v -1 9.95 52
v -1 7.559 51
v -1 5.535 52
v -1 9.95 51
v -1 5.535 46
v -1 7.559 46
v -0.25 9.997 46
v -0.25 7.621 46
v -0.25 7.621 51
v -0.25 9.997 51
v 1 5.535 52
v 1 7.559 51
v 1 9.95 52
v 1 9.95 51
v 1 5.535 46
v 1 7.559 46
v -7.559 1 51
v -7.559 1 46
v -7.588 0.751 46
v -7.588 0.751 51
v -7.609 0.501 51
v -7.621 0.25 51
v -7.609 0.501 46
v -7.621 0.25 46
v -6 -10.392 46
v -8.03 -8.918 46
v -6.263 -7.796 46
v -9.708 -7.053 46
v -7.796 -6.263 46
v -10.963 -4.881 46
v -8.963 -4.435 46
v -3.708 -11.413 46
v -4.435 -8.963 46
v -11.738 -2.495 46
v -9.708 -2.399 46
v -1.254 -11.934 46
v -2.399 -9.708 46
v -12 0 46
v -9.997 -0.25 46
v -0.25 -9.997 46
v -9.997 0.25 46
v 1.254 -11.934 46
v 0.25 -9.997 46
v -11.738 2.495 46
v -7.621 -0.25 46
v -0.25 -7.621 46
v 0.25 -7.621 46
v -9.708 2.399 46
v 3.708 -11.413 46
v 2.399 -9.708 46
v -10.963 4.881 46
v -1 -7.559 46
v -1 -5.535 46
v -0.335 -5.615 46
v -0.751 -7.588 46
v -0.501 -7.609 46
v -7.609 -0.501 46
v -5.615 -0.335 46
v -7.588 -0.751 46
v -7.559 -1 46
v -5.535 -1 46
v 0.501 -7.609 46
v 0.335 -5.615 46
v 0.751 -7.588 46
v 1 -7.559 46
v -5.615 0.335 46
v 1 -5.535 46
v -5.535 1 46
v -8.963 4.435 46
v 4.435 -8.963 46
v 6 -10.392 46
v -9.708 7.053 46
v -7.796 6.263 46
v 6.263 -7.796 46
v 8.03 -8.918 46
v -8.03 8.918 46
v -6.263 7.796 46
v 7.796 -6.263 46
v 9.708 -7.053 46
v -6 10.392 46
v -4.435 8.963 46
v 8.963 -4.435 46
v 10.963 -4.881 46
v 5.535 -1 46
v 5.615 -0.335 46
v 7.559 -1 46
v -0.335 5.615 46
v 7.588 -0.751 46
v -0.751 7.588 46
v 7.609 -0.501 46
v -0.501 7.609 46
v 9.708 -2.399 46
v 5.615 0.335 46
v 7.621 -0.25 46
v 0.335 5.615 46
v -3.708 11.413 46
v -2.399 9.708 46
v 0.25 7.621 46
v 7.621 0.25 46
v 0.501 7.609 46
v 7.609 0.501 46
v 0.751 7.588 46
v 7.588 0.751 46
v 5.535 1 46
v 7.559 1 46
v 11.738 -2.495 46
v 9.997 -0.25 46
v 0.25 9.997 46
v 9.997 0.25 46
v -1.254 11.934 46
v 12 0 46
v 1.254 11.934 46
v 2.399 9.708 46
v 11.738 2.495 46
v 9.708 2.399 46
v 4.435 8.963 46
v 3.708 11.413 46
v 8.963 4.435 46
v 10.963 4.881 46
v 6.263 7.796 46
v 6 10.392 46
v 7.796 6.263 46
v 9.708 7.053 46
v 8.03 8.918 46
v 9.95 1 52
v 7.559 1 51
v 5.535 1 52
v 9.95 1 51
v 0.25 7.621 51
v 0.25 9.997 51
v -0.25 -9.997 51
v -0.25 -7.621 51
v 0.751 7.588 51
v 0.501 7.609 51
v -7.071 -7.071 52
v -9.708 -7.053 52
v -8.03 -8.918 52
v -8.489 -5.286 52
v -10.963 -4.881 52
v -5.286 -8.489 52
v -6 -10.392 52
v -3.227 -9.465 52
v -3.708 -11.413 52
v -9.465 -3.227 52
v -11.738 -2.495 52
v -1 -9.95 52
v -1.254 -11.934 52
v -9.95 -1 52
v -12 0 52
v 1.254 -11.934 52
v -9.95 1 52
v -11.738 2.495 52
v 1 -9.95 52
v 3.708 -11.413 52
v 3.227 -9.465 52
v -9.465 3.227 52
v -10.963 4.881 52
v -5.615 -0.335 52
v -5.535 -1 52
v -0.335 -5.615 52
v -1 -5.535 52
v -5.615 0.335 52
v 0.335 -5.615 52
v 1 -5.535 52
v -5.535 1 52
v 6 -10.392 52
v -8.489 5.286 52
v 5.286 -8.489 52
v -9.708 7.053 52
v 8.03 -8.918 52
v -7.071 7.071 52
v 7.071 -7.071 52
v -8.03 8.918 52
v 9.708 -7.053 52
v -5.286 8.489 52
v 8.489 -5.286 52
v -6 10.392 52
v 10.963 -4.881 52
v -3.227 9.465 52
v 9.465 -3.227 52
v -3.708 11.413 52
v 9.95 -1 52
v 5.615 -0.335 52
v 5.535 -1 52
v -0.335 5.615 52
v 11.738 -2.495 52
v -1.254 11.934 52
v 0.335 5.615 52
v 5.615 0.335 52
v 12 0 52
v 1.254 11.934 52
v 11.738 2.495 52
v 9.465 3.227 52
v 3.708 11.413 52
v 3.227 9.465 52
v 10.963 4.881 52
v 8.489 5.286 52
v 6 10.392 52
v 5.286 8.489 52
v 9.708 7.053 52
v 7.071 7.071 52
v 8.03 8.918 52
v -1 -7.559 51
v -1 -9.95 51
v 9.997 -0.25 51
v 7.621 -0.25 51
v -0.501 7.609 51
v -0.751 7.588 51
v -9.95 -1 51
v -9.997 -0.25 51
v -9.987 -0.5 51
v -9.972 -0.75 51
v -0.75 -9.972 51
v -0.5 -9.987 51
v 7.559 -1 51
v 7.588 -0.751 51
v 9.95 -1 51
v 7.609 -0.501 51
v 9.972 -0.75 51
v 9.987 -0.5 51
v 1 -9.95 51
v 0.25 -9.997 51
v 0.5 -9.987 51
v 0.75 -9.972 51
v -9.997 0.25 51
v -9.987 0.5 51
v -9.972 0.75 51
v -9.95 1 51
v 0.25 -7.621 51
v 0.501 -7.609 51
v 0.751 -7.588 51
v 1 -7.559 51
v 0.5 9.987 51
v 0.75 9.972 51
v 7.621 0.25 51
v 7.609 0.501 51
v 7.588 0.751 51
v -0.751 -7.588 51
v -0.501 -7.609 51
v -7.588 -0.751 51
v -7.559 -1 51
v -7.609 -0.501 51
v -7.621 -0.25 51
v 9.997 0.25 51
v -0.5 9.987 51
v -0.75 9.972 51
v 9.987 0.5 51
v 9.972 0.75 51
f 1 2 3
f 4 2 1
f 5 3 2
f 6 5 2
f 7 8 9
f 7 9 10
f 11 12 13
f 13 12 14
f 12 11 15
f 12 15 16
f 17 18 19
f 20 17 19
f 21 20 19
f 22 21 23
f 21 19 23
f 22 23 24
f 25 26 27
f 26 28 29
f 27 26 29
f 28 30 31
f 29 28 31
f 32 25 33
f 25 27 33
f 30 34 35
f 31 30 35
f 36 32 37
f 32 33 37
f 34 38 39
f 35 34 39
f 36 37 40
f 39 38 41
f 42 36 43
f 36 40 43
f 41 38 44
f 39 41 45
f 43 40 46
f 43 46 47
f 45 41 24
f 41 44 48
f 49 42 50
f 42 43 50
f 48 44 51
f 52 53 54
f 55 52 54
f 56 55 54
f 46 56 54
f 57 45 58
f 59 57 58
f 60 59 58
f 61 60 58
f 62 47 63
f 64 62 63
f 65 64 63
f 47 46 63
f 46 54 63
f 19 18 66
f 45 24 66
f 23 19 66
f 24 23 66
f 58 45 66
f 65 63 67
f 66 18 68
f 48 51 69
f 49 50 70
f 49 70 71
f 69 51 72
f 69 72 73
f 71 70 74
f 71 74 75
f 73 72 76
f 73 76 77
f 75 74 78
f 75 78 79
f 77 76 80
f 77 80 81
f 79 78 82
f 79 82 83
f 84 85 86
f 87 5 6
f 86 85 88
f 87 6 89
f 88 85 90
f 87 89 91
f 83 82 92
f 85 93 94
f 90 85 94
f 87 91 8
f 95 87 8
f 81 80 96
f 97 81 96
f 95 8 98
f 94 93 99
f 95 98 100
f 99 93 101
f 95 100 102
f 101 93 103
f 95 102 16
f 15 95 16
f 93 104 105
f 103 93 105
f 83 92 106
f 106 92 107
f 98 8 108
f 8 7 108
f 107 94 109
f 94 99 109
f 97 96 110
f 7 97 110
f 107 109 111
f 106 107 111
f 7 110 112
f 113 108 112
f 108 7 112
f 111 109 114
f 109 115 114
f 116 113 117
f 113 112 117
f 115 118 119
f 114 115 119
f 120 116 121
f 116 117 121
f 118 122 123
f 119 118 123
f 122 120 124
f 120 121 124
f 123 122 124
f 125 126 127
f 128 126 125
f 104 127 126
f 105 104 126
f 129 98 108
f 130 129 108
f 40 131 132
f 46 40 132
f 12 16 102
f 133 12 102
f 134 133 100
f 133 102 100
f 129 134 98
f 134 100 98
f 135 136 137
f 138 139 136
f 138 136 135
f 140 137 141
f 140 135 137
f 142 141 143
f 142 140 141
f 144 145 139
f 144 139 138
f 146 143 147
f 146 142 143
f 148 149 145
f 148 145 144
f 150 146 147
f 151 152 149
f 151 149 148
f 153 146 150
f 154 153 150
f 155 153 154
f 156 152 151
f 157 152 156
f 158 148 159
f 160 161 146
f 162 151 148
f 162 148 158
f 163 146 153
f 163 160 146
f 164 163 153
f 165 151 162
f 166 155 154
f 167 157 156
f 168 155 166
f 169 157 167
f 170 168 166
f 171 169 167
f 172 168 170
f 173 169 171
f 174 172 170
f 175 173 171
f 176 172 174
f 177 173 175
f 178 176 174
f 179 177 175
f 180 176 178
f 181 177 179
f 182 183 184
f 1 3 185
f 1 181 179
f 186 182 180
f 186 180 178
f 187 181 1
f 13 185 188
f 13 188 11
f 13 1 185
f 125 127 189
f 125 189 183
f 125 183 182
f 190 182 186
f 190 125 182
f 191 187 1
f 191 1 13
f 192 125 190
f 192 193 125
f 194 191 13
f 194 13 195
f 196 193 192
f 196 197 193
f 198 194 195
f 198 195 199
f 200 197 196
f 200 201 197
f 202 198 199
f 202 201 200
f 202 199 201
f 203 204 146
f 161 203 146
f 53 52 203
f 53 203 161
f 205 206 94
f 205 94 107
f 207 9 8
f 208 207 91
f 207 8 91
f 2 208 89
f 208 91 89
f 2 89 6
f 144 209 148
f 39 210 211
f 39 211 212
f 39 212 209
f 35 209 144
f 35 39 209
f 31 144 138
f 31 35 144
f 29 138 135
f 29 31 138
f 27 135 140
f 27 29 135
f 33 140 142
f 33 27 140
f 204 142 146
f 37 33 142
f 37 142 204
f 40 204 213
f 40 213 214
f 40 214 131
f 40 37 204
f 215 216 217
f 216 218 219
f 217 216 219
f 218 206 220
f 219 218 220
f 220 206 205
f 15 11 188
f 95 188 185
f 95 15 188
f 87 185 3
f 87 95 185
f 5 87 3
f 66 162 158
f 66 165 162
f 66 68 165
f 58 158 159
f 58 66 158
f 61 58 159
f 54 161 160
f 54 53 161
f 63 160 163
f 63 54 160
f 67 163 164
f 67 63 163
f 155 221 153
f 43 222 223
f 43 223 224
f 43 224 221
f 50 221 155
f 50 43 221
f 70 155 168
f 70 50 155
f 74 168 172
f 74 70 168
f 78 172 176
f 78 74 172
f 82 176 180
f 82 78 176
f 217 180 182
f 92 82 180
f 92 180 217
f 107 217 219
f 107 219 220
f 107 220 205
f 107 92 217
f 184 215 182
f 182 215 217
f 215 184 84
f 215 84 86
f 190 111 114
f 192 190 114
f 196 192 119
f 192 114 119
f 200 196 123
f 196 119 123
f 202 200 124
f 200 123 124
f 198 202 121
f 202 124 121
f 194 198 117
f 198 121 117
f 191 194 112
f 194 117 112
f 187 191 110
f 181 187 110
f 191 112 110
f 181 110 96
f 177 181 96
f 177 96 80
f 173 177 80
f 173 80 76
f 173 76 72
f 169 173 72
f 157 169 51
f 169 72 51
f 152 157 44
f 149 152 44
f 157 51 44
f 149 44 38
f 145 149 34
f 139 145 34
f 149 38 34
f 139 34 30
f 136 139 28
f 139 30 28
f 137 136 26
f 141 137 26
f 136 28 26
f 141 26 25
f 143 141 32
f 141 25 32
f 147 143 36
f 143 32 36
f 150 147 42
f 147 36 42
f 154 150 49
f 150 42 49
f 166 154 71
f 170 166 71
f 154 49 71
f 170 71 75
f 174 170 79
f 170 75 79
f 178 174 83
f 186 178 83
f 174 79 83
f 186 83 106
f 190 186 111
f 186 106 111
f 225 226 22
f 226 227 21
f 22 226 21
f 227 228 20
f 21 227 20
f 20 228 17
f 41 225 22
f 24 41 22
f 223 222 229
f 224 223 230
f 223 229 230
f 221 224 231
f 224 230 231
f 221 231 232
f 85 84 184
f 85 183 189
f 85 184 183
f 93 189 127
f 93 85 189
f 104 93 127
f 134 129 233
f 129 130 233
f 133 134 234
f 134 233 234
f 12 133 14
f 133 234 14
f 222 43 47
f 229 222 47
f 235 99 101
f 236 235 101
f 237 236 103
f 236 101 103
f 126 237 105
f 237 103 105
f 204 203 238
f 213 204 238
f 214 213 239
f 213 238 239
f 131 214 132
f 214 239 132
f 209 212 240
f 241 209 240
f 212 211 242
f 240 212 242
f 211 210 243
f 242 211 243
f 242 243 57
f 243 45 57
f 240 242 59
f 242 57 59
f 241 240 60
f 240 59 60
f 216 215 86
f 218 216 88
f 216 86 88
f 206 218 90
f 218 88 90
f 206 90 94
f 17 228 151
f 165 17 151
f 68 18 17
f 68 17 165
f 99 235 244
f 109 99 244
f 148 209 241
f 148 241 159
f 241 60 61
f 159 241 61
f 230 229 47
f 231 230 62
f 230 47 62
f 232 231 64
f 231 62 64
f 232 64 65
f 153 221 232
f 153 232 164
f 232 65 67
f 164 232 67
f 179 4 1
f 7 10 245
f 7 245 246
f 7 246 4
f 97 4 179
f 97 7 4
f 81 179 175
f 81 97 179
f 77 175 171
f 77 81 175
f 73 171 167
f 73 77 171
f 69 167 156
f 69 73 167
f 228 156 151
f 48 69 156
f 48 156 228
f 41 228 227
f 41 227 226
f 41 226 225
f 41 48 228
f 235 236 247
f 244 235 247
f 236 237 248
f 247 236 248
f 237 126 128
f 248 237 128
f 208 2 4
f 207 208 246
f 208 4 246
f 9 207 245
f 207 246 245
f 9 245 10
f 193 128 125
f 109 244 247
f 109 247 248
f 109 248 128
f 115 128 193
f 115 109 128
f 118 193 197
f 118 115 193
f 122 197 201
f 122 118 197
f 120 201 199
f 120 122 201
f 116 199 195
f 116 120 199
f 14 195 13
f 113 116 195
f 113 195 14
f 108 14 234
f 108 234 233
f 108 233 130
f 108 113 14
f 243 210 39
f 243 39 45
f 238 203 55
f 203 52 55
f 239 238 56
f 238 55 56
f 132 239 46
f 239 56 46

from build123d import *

# Parameters (mm, degrees)
BOX011_W                    = 20
BOX011_H                    = 2
BOX011_DEPTH                = 80
BOX012_W                    = 20
BOX012_H                    = 2
BOX012_DEPTH                = 80
COMPOUND005_PLACEMENT_ANGLE = 90
TUBE013_R                   = 10
TUBE013_R_2                 = 3.25
TUBE013_DEPTH               = 80
TUBE008_R                   = 7.625
TUBE008_R_2                 = 5.625
TUBE008_DEPTH               = 5
TUBE007_R                   = 7.625
TUBE007_R_2                 = 5.625
TUBE007_DEPTH               = 5
BOX005_W                    = 20
BOX005_H                    = 0.5
BOX005_DEPTH                = 40
BOX006_W                    = 20
BOX006_H                    = 0.5
BOX006_DEPTH                = 40
COMPOUND002_PLACEMENT_ANGLE = 90
TUBE006_R                   = 10
TUBE006_R_2                 = 3.25
TUBE006_DEPTH               = 40
CYLINDER002_R               = 5.625
CYLINDER002_DEPTH           = 100
CYLINDER001_R               = 12
CYLINDER001_DEPTH           = 6


with BuildPart() as cube011:
    # Box011 → Box011 (new body)
    with BuildSketch(Plane(origin=(-10, -1, -20), x_dir=(1, 0, 0), z_dir=(0, 0, 1))):
        with Locations((10, 1)):
            Rectangle(BOX011_W, BOX011_H)
    extrude(amount=BOX011_DEPTH)


with BuildPart() as fusion008:
    # Box012 → Box012 (new body)
    with BuildSketch(Plane(origin=(-10, -1, -20), x_dir=(1, 0, 0), z_dir=(0, 0, 1))):
        with Locations((10, 1)):
            Rectangle(BOX012_W, BOX012_H)
    extrude(amount=BOX012_DEPTH)


with BuildPart() as fusion008_1:
    # Compound005 placement: moved
    add(fusion008.part.rotate(Axis((0, 0, 0), (0, 0, 1)), COMPOUND005_PLACEMENT_ANGLE))

    # Fusion008: union Cube011
    add(cube011.part)


with BuildPart() as cut018:
    # Tube013 → Tube013 (new body)
    with BuildSketch(Plane.XY.offset(-20)):
        Circle(TUBE013_R)
        Circle(TUBE013_R_2, mode=Mode.SUBTRACT)
    extrude(amount=TUBE013_DEPTH)

    # Cut018: cut Fusion008
    add(fusion008_1.part, mode=Mode.SUBTRACT)


with BuildPart() as mountringgroove005:
    # Tube008 → Tube008 (new body)
    with BuildSketch(Plane.XY.offset(35)):
        Circle(TUBE008_R)
        Circle(TUBE008_R_2, mode=Mode.SUBTRACT)
    extrude(amount=TUBE008_DEPTH)


with BuildPart() as mountringgroove004:
    # Tube007 → Tube007 (new body)
    with BuildSketch(Plane.XY):
        Circle(TUBE007_R)
        Circle(TUBE007_R_2, mode=Mode.SUBTRACT)
    extrude(amount=TUBE007_DEPTH)


with BuildPart() as cube005:
    # Box005 → Box005 (new body)
    with BuildSketch(Plane(origin=(-10, -0.25, 0), x_dir=(1, 0, 0), z_dir=(0, 0, 1))):
        with Locations((10, 0.25)):
            Rectangle(BOX005_W, BOX005_H)
    extrude(amount=BOX005_DEPTH)


with BuildPart() as fusion002:
    # Box006 → Box006 (new body)
    with BuildSketch(Plane(origin=(-10, -0.25, 0), x_dir=(1, 0, 0), z_dir=(0, 0, 1))):
        with Locations((10, 0.25)):
            Rectangle(BOX006_W, BOX006_H)
    extrude(amount=BOX006_DEPTH)


with BuildPart() as fusion002_1:
    # Compound002 placement: moved
    add(fusion002.part.rotate(Axis((0, 0, 0), (0, 0, 1)), COMPOUND002_PLACEMENT_ANGLE))

    # Fusion002: union Cube005
    add(cube005.part)


with BuildPart() as cut011:
    # Tube006 → Tube006 (new body)
    with BuildSketch(Plane.XY):
        Circle(TUBE006_R)
        Circle(TUBE006_R_2, mode=Mode.SUBTRACT)
    extrude(amount=TUBE006_DEPTH)

    # Cut009: cut Fusion002
    add(fusion002_1.part, mode=Mode.SUBTRACT)

    # Cut010: cut MountringGroove004
    add(mountringgroove004.part, mode=Mode.SUBTRACT)

    # Cut011: cut MountringGroove005
    add(mountringgroove005.part, mode=Mode.SUBTRACT)


with BuildPart() as cut011_1:
    # Cut011 placement: moved
    add(cut011.part.moved(Location((0, 0, 7))))


with BuildPart() as cylinder002:
    # Cylinder002 → Cylinder002 (new body)
    with BuildSketch(Plane.XY):
        Circle(CYLINDER002_R)
    extrude(amount=CYLINDER002_DEPTH)


with BuildPart() as topring:
    # Cylinder001 → Cylinder001 (new body)
    with BuildSketch(Plane.XY.offset(42)):
        Circle(CYLINDER001_R)
    extrude(amount=CYLINDER001_DEPTH)

    # Cut008: cut Cylinder002
    add(cylinder002.part, mode=Mode.SUBTRACT)

    # Cut012: cut Cut011
    add(cut011_1.part, mode=Mode.SUBTRACT)


with BuildPart() as topring_1:
    # Cut012 placement: moved
    add(topring.part.moved(Location((0, 0, 4))))

    # Cut019: cut Cut018
    add(cut018.part, mode=Mode.SUBTRACT)


solid = topring_1.part
